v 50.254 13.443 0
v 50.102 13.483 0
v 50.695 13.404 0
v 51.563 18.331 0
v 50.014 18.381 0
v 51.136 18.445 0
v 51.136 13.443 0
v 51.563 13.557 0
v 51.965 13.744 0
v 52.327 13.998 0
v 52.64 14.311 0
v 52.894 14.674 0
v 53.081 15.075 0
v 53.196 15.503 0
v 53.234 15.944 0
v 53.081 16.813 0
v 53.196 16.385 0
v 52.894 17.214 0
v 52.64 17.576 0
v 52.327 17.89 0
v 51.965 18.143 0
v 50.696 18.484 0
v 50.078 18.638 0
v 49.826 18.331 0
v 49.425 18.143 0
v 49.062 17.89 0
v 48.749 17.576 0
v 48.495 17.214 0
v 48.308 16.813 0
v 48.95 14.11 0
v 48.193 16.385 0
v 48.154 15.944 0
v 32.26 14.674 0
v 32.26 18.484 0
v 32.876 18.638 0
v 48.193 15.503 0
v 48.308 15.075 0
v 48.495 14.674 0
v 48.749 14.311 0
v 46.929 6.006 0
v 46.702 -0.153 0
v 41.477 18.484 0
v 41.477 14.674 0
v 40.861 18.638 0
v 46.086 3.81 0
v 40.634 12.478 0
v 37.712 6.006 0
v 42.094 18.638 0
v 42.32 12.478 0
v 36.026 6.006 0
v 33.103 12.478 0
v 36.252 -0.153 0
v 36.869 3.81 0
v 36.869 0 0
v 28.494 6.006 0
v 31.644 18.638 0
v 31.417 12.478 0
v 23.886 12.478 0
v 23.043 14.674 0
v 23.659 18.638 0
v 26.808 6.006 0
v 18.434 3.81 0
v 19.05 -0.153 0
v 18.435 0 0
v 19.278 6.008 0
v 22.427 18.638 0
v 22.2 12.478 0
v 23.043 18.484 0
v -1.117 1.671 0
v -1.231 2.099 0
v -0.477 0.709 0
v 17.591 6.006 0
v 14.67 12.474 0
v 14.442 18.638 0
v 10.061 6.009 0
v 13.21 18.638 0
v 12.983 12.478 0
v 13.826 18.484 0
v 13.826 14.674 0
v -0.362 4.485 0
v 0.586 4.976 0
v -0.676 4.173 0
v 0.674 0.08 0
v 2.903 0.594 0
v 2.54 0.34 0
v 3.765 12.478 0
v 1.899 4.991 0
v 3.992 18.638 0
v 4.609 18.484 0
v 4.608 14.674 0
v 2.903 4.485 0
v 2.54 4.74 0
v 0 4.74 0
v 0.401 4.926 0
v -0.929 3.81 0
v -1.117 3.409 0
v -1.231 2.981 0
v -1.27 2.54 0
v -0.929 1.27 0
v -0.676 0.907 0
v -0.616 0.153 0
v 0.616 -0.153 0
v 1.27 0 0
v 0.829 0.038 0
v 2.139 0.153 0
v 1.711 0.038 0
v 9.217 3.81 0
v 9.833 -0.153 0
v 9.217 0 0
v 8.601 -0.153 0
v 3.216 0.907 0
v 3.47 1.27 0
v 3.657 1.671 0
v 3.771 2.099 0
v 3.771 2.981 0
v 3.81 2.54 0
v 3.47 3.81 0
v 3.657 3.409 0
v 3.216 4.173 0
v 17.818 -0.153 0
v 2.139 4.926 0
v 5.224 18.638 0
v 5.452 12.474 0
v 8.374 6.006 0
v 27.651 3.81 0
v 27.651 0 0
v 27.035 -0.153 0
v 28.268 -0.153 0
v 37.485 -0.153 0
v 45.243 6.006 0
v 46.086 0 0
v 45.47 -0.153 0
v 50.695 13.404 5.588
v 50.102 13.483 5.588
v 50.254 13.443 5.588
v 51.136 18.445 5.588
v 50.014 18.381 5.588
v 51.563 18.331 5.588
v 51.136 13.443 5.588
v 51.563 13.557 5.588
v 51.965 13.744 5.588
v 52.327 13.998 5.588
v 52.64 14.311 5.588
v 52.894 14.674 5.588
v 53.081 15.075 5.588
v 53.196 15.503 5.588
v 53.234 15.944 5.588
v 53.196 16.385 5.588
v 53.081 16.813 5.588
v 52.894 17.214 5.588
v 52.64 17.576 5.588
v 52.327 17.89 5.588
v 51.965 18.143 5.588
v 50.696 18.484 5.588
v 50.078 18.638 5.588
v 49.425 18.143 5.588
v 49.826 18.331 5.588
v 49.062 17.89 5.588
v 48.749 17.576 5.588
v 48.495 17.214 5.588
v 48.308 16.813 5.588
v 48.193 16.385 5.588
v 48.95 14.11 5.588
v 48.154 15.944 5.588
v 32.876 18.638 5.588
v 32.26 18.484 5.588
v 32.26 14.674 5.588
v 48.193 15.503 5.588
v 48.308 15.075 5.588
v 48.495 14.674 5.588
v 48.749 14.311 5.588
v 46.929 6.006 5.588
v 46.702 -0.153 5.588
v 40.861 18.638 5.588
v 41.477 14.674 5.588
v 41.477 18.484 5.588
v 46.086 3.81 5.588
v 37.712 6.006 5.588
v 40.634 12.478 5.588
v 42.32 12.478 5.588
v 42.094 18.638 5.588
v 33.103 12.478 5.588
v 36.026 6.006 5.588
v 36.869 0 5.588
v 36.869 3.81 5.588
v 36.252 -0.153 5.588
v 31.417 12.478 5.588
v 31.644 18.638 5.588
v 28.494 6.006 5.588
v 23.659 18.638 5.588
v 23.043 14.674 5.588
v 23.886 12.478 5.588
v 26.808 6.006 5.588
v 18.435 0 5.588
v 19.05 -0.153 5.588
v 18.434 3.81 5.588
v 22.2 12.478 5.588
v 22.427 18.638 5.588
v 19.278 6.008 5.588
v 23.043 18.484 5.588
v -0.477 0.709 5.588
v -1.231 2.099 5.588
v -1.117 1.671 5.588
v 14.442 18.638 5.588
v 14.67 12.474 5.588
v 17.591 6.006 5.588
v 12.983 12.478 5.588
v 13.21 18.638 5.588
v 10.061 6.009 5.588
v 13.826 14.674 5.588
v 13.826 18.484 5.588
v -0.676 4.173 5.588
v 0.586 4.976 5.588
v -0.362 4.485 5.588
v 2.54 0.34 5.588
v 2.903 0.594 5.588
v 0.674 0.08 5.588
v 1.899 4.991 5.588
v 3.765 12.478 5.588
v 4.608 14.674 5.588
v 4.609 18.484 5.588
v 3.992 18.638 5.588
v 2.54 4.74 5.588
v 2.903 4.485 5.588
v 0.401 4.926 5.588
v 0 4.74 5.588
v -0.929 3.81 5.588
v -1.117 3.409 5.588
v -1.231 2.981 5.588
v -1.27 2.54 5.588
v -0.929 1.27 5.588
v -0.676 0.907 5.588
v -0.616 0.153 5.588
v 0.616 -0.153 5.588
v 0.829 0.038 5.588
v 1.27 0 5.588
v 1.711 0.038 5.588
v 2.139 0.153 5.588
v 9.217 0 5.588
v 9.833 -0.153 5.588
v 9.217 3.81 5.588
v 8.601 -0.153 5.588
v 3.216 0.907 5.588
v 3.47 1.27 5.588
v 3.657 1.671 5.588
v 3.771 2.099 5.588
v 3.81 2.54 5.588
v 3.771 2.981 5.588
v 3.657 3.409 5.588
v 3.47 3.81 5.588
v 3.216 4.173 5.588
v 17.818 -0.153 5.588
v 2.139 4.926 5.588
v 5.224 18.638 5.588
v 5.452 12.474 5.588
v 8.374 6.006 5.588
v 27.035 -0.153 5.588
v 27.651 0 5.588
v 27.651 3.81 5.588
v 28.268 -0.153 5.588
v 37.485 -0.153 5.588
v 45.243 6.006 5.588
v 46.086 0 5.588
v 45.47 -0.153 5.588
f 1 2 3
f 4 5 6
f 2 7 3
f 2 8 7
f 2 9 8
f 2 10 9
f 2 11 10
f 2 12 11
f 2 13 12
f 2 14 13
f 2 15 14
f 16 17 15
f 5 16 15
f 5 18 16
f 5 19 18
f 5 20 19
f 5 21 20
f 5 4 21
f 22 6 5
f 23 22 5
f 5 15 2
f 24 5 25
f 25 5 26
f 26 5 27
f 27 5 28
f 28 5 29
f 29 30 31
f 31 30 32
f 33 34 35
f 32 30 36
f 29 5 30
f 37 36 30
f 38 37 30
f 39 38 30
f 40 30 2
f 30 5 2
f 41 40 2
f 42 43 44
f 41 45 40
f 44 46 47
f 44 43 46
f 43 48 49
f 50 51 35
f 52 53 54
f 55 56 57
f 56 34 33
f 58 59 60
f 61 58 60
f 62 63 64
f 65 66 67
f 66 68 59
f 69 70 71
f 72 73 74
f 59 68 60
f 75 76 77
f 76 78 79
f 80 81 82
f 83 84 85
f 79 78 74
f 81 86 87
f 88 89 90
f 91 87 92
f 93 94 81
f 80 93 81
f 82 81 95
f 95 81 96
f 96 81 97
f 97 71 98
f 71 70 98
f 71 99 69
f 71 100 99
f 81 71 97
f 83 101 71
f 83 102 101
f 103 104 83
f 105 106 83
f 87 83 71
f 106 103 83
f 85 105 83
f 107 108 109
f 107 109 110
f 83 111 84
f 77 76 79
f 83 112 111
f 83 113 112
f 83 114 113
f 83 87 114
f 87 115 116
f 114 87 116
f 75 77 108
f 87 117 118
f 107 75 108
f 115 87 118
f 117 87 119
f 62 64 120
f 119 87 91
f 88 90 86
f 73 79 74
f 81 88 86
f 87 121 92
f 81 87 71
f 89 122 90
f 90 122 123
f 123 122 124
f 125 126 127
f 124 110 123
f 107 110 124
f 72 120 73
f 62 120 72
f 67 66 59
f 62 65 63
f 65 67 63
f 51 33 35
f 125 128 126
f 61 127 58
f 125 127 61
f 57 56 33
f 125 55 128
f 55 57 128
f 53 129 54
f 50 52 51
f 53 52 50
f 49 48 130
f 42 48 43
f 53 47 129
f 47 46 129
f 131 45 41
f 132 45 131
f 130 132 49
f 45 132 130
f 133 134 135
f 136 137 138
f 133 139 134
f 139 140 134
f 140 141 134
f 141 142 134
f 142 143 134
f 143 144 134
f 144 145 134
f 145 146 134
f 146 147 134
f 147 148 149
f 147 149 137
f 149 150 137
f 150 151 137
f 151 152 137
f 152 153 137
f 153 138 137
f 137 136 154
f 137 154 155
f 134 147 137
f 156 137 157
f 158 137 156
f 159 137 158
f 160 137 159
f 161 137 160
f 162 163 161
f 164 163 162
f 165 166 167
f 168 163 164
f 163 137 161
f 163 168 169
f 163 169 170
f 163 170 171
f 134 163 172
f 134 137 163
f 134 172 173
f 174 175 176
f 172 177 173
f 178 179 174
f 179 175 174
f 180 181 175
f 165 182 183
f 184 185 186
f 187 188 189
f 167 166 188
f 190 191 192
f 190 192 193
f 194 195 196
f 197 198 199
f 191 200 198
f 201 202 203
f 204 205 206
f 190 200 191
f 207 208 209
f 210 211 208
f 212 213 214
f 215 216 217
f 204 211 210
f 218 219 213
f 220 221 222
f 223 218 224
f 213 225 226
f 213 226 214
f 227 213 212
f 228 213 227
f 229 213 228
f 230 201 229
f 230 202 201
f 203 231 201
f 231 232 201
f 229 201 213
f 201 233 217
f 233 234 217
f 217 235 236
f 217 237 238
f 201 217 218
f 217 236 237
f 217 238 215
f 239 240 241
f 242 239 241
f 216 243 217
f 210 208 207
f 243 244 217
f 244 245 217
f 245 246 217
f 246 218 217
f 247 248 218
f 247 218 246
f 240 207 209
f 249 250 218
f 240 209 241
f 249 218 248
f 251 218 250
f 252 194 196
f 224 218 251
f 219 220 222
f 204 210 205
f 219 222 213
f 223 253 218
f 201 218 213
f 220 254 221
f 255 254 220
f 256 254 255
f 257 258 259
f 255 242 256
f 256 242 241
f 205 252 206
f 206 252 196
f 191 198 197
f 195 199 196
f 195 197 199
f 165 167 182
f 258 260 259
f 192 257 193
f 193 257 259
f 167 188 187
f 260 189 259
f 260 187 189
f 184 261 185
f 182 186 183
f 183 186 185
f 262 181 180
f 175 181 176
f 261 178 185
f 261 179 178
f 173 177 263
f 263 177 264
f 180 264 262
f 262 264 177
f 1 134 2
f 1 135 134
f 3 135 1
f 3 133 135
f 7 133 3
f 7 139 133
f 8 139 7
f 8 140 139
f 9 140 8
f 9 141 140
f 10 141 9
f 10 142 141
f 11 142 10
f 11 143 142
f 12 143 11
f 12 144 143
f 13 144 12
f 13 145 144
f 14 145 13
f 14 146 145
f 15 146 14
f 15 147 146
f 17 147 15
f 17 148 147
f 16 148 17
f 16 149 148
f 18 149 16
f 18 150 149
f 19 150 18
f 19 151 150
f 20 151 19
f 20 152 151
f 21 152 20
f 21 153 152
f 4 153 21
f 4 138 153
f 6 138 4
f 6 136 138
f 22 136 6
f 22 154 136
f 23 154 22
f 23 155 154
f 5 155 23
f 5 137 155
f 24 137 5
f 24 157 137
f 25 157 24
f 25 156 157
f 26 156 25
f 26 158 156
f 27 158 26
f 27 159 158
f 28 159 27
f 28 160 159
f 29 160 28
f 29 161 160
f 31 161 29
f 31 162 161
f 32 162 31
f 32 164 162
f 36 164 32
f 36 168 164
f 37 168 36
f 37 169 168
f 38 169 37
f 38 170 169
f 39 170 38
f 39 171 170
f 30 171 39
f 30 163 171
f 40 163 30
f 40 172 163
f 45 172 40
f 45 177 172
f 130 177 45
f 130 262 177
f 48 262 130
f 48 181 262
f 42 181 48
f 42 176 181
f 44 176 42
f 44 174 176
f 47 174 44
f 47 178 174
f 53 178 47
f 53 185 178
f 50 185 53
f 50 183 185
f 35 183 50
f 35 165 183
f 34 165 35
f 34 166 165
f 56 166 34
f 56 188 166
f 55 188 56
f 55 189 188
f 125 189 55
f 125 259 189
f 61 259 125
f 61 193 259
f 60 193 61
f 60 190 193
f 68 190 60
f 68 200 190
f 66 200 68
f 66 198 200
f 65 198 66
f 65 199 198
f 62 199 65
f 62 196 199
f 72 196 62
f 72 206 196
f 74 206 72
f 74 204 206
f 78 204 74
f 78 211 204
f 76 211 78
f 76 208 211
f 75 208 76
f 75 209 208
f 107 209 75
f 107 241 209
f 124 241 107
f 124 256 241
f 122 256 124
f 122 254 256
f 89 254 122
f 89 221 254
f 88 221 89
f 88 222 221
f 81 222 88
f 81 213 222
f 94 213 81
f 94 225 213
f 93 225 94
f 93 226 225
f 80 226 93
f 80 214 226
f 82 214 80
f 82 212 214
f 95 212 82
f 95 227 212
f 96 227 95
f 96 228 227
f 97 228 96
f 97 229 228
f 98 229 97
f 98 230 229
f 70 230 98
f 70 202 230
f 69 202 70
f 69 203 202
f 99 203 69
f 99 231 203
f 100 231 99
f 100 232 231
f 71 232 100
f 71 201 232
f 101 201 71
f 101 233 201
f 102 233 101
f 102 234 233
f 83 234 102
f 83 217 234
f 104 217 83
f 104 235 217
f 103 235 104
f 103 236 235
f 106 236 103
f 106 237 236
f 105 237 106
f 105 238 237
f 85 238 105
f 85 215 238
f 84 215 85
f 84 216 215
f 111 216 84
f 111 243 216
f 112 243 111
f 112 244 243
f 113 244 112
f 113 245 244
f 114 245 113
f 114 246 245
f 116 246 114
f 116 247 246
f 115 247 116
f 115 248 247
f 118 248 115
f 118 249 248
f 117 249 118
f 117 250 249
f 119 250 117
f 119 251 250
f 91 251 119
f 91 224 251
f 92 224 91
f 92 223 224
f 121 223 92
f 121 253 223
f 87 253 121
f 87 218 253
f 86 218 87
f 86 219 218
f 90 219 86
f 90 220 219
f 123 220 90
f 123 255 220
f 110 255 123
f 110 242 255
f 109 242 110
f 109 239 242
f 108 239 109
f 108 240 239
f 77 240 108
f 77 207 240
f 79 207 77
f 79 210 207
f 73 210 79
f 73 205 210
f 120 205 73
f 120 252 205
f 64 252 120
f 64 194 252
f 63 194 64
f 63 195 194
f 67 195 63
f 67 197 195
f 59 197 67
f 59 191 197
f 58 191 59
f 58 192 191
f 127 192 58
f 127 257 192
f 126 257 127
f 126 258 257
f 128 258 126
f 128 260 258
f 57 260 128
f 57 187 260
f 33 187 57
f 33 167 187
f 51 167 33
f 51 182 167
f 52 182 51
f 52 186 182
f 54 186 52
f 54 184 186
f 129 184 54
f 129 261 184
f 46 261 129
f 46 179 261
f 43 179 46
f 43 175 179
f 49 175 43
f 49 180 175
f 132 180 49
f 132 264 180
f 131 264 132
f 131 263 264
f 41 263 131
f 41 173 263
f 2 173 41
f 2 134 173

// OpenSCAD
// file: ../Components/Semicircle.scad
module semicircle(od=3/4, angle=225, center=false, $fn=50) {
  rotate(center ? angle/2 : 0)
  rotate([0,0,-(angle % 90)])
  difference() {
    union() {
      intersection() {

        // Main Body
        circle(r=od/2);

        // 90* Angle cutters
        if (angle < 360)
        for (i=[0: (angle / 90)]) {

          // First angle, angle mod 90
          if (i == 0)
          polygon(points=[[0,0],
                          [od,0],
                          [cos(angle%90) * od, sin(angle%90) * od]]);

          // 90* sections
          if (i>0)
          rotate([0,0,-90*i])
          square([od, od]);
        }

      }
    }
  }
}

module semidonut(major=3/4, minor=1/2, angle=225, center=false, $fn=50) {
  difference() {
    semicircle(od=major, angle=angle, center=center, $fn=$fn);

    circle(r=minor/2);
  }
}

scale([25.4, 25.4, 25.4])
semidonut();
// main file
use <../Components/Semicircle.scad>;

module FlatCompressionSpring(springHeight=0.22, segmentLength=0.75, segmentWidth=0.05,
                         segments=11, angle=14, infill=1) {

  opposite = sin(angle) * segmentLength;
  adjacent = cos(angle) * segmentLength;
  spacing = opposite*2;

  linear_extrude(height=springHeight)
  union() {

    // Spring
    for(i = [0:segments-1]) {

      // Main Section
      translate([ceil(i/2) * spacing,0,0])
      rotate([0,0,(i % 2 == 0 ? -1 : 1) * angle])
      translate([-segmentWidth/2,0])
      square([segmentWidth, segmentLength]);

      // Strain Relief
      if (i != 0)
      translate([i * opposite,(i%2 == 0) ? 0 : adjacent,0])
      rotate([0,0,(i%2==0) ? 90 : -90])
      difference() {
        rotate([0,0,angle])
        semicircle(angle=angle*2, od=infill*2);

        translate([segmentWidth*3,0])
        rotate([0,0,angle*1.5])
        semicircle(angle=angle*3, od=infill*2);
      };
    }

    // Origin Print Adhesion Anchor
    translate([segmentWidth,segmentWidth*2,0])
    circle(r=segmentWidth*2, $fn=36);

    // Final Segment Print Adhesion Anchor
    translate([(opposite * segments),adjacent -(segmentWidth*2),0])
    circle(r=segmentWidth*2, $fn=36);
  }
}

scale([25.4, 25.4, 25.4])
FlatCompressionSpring();
